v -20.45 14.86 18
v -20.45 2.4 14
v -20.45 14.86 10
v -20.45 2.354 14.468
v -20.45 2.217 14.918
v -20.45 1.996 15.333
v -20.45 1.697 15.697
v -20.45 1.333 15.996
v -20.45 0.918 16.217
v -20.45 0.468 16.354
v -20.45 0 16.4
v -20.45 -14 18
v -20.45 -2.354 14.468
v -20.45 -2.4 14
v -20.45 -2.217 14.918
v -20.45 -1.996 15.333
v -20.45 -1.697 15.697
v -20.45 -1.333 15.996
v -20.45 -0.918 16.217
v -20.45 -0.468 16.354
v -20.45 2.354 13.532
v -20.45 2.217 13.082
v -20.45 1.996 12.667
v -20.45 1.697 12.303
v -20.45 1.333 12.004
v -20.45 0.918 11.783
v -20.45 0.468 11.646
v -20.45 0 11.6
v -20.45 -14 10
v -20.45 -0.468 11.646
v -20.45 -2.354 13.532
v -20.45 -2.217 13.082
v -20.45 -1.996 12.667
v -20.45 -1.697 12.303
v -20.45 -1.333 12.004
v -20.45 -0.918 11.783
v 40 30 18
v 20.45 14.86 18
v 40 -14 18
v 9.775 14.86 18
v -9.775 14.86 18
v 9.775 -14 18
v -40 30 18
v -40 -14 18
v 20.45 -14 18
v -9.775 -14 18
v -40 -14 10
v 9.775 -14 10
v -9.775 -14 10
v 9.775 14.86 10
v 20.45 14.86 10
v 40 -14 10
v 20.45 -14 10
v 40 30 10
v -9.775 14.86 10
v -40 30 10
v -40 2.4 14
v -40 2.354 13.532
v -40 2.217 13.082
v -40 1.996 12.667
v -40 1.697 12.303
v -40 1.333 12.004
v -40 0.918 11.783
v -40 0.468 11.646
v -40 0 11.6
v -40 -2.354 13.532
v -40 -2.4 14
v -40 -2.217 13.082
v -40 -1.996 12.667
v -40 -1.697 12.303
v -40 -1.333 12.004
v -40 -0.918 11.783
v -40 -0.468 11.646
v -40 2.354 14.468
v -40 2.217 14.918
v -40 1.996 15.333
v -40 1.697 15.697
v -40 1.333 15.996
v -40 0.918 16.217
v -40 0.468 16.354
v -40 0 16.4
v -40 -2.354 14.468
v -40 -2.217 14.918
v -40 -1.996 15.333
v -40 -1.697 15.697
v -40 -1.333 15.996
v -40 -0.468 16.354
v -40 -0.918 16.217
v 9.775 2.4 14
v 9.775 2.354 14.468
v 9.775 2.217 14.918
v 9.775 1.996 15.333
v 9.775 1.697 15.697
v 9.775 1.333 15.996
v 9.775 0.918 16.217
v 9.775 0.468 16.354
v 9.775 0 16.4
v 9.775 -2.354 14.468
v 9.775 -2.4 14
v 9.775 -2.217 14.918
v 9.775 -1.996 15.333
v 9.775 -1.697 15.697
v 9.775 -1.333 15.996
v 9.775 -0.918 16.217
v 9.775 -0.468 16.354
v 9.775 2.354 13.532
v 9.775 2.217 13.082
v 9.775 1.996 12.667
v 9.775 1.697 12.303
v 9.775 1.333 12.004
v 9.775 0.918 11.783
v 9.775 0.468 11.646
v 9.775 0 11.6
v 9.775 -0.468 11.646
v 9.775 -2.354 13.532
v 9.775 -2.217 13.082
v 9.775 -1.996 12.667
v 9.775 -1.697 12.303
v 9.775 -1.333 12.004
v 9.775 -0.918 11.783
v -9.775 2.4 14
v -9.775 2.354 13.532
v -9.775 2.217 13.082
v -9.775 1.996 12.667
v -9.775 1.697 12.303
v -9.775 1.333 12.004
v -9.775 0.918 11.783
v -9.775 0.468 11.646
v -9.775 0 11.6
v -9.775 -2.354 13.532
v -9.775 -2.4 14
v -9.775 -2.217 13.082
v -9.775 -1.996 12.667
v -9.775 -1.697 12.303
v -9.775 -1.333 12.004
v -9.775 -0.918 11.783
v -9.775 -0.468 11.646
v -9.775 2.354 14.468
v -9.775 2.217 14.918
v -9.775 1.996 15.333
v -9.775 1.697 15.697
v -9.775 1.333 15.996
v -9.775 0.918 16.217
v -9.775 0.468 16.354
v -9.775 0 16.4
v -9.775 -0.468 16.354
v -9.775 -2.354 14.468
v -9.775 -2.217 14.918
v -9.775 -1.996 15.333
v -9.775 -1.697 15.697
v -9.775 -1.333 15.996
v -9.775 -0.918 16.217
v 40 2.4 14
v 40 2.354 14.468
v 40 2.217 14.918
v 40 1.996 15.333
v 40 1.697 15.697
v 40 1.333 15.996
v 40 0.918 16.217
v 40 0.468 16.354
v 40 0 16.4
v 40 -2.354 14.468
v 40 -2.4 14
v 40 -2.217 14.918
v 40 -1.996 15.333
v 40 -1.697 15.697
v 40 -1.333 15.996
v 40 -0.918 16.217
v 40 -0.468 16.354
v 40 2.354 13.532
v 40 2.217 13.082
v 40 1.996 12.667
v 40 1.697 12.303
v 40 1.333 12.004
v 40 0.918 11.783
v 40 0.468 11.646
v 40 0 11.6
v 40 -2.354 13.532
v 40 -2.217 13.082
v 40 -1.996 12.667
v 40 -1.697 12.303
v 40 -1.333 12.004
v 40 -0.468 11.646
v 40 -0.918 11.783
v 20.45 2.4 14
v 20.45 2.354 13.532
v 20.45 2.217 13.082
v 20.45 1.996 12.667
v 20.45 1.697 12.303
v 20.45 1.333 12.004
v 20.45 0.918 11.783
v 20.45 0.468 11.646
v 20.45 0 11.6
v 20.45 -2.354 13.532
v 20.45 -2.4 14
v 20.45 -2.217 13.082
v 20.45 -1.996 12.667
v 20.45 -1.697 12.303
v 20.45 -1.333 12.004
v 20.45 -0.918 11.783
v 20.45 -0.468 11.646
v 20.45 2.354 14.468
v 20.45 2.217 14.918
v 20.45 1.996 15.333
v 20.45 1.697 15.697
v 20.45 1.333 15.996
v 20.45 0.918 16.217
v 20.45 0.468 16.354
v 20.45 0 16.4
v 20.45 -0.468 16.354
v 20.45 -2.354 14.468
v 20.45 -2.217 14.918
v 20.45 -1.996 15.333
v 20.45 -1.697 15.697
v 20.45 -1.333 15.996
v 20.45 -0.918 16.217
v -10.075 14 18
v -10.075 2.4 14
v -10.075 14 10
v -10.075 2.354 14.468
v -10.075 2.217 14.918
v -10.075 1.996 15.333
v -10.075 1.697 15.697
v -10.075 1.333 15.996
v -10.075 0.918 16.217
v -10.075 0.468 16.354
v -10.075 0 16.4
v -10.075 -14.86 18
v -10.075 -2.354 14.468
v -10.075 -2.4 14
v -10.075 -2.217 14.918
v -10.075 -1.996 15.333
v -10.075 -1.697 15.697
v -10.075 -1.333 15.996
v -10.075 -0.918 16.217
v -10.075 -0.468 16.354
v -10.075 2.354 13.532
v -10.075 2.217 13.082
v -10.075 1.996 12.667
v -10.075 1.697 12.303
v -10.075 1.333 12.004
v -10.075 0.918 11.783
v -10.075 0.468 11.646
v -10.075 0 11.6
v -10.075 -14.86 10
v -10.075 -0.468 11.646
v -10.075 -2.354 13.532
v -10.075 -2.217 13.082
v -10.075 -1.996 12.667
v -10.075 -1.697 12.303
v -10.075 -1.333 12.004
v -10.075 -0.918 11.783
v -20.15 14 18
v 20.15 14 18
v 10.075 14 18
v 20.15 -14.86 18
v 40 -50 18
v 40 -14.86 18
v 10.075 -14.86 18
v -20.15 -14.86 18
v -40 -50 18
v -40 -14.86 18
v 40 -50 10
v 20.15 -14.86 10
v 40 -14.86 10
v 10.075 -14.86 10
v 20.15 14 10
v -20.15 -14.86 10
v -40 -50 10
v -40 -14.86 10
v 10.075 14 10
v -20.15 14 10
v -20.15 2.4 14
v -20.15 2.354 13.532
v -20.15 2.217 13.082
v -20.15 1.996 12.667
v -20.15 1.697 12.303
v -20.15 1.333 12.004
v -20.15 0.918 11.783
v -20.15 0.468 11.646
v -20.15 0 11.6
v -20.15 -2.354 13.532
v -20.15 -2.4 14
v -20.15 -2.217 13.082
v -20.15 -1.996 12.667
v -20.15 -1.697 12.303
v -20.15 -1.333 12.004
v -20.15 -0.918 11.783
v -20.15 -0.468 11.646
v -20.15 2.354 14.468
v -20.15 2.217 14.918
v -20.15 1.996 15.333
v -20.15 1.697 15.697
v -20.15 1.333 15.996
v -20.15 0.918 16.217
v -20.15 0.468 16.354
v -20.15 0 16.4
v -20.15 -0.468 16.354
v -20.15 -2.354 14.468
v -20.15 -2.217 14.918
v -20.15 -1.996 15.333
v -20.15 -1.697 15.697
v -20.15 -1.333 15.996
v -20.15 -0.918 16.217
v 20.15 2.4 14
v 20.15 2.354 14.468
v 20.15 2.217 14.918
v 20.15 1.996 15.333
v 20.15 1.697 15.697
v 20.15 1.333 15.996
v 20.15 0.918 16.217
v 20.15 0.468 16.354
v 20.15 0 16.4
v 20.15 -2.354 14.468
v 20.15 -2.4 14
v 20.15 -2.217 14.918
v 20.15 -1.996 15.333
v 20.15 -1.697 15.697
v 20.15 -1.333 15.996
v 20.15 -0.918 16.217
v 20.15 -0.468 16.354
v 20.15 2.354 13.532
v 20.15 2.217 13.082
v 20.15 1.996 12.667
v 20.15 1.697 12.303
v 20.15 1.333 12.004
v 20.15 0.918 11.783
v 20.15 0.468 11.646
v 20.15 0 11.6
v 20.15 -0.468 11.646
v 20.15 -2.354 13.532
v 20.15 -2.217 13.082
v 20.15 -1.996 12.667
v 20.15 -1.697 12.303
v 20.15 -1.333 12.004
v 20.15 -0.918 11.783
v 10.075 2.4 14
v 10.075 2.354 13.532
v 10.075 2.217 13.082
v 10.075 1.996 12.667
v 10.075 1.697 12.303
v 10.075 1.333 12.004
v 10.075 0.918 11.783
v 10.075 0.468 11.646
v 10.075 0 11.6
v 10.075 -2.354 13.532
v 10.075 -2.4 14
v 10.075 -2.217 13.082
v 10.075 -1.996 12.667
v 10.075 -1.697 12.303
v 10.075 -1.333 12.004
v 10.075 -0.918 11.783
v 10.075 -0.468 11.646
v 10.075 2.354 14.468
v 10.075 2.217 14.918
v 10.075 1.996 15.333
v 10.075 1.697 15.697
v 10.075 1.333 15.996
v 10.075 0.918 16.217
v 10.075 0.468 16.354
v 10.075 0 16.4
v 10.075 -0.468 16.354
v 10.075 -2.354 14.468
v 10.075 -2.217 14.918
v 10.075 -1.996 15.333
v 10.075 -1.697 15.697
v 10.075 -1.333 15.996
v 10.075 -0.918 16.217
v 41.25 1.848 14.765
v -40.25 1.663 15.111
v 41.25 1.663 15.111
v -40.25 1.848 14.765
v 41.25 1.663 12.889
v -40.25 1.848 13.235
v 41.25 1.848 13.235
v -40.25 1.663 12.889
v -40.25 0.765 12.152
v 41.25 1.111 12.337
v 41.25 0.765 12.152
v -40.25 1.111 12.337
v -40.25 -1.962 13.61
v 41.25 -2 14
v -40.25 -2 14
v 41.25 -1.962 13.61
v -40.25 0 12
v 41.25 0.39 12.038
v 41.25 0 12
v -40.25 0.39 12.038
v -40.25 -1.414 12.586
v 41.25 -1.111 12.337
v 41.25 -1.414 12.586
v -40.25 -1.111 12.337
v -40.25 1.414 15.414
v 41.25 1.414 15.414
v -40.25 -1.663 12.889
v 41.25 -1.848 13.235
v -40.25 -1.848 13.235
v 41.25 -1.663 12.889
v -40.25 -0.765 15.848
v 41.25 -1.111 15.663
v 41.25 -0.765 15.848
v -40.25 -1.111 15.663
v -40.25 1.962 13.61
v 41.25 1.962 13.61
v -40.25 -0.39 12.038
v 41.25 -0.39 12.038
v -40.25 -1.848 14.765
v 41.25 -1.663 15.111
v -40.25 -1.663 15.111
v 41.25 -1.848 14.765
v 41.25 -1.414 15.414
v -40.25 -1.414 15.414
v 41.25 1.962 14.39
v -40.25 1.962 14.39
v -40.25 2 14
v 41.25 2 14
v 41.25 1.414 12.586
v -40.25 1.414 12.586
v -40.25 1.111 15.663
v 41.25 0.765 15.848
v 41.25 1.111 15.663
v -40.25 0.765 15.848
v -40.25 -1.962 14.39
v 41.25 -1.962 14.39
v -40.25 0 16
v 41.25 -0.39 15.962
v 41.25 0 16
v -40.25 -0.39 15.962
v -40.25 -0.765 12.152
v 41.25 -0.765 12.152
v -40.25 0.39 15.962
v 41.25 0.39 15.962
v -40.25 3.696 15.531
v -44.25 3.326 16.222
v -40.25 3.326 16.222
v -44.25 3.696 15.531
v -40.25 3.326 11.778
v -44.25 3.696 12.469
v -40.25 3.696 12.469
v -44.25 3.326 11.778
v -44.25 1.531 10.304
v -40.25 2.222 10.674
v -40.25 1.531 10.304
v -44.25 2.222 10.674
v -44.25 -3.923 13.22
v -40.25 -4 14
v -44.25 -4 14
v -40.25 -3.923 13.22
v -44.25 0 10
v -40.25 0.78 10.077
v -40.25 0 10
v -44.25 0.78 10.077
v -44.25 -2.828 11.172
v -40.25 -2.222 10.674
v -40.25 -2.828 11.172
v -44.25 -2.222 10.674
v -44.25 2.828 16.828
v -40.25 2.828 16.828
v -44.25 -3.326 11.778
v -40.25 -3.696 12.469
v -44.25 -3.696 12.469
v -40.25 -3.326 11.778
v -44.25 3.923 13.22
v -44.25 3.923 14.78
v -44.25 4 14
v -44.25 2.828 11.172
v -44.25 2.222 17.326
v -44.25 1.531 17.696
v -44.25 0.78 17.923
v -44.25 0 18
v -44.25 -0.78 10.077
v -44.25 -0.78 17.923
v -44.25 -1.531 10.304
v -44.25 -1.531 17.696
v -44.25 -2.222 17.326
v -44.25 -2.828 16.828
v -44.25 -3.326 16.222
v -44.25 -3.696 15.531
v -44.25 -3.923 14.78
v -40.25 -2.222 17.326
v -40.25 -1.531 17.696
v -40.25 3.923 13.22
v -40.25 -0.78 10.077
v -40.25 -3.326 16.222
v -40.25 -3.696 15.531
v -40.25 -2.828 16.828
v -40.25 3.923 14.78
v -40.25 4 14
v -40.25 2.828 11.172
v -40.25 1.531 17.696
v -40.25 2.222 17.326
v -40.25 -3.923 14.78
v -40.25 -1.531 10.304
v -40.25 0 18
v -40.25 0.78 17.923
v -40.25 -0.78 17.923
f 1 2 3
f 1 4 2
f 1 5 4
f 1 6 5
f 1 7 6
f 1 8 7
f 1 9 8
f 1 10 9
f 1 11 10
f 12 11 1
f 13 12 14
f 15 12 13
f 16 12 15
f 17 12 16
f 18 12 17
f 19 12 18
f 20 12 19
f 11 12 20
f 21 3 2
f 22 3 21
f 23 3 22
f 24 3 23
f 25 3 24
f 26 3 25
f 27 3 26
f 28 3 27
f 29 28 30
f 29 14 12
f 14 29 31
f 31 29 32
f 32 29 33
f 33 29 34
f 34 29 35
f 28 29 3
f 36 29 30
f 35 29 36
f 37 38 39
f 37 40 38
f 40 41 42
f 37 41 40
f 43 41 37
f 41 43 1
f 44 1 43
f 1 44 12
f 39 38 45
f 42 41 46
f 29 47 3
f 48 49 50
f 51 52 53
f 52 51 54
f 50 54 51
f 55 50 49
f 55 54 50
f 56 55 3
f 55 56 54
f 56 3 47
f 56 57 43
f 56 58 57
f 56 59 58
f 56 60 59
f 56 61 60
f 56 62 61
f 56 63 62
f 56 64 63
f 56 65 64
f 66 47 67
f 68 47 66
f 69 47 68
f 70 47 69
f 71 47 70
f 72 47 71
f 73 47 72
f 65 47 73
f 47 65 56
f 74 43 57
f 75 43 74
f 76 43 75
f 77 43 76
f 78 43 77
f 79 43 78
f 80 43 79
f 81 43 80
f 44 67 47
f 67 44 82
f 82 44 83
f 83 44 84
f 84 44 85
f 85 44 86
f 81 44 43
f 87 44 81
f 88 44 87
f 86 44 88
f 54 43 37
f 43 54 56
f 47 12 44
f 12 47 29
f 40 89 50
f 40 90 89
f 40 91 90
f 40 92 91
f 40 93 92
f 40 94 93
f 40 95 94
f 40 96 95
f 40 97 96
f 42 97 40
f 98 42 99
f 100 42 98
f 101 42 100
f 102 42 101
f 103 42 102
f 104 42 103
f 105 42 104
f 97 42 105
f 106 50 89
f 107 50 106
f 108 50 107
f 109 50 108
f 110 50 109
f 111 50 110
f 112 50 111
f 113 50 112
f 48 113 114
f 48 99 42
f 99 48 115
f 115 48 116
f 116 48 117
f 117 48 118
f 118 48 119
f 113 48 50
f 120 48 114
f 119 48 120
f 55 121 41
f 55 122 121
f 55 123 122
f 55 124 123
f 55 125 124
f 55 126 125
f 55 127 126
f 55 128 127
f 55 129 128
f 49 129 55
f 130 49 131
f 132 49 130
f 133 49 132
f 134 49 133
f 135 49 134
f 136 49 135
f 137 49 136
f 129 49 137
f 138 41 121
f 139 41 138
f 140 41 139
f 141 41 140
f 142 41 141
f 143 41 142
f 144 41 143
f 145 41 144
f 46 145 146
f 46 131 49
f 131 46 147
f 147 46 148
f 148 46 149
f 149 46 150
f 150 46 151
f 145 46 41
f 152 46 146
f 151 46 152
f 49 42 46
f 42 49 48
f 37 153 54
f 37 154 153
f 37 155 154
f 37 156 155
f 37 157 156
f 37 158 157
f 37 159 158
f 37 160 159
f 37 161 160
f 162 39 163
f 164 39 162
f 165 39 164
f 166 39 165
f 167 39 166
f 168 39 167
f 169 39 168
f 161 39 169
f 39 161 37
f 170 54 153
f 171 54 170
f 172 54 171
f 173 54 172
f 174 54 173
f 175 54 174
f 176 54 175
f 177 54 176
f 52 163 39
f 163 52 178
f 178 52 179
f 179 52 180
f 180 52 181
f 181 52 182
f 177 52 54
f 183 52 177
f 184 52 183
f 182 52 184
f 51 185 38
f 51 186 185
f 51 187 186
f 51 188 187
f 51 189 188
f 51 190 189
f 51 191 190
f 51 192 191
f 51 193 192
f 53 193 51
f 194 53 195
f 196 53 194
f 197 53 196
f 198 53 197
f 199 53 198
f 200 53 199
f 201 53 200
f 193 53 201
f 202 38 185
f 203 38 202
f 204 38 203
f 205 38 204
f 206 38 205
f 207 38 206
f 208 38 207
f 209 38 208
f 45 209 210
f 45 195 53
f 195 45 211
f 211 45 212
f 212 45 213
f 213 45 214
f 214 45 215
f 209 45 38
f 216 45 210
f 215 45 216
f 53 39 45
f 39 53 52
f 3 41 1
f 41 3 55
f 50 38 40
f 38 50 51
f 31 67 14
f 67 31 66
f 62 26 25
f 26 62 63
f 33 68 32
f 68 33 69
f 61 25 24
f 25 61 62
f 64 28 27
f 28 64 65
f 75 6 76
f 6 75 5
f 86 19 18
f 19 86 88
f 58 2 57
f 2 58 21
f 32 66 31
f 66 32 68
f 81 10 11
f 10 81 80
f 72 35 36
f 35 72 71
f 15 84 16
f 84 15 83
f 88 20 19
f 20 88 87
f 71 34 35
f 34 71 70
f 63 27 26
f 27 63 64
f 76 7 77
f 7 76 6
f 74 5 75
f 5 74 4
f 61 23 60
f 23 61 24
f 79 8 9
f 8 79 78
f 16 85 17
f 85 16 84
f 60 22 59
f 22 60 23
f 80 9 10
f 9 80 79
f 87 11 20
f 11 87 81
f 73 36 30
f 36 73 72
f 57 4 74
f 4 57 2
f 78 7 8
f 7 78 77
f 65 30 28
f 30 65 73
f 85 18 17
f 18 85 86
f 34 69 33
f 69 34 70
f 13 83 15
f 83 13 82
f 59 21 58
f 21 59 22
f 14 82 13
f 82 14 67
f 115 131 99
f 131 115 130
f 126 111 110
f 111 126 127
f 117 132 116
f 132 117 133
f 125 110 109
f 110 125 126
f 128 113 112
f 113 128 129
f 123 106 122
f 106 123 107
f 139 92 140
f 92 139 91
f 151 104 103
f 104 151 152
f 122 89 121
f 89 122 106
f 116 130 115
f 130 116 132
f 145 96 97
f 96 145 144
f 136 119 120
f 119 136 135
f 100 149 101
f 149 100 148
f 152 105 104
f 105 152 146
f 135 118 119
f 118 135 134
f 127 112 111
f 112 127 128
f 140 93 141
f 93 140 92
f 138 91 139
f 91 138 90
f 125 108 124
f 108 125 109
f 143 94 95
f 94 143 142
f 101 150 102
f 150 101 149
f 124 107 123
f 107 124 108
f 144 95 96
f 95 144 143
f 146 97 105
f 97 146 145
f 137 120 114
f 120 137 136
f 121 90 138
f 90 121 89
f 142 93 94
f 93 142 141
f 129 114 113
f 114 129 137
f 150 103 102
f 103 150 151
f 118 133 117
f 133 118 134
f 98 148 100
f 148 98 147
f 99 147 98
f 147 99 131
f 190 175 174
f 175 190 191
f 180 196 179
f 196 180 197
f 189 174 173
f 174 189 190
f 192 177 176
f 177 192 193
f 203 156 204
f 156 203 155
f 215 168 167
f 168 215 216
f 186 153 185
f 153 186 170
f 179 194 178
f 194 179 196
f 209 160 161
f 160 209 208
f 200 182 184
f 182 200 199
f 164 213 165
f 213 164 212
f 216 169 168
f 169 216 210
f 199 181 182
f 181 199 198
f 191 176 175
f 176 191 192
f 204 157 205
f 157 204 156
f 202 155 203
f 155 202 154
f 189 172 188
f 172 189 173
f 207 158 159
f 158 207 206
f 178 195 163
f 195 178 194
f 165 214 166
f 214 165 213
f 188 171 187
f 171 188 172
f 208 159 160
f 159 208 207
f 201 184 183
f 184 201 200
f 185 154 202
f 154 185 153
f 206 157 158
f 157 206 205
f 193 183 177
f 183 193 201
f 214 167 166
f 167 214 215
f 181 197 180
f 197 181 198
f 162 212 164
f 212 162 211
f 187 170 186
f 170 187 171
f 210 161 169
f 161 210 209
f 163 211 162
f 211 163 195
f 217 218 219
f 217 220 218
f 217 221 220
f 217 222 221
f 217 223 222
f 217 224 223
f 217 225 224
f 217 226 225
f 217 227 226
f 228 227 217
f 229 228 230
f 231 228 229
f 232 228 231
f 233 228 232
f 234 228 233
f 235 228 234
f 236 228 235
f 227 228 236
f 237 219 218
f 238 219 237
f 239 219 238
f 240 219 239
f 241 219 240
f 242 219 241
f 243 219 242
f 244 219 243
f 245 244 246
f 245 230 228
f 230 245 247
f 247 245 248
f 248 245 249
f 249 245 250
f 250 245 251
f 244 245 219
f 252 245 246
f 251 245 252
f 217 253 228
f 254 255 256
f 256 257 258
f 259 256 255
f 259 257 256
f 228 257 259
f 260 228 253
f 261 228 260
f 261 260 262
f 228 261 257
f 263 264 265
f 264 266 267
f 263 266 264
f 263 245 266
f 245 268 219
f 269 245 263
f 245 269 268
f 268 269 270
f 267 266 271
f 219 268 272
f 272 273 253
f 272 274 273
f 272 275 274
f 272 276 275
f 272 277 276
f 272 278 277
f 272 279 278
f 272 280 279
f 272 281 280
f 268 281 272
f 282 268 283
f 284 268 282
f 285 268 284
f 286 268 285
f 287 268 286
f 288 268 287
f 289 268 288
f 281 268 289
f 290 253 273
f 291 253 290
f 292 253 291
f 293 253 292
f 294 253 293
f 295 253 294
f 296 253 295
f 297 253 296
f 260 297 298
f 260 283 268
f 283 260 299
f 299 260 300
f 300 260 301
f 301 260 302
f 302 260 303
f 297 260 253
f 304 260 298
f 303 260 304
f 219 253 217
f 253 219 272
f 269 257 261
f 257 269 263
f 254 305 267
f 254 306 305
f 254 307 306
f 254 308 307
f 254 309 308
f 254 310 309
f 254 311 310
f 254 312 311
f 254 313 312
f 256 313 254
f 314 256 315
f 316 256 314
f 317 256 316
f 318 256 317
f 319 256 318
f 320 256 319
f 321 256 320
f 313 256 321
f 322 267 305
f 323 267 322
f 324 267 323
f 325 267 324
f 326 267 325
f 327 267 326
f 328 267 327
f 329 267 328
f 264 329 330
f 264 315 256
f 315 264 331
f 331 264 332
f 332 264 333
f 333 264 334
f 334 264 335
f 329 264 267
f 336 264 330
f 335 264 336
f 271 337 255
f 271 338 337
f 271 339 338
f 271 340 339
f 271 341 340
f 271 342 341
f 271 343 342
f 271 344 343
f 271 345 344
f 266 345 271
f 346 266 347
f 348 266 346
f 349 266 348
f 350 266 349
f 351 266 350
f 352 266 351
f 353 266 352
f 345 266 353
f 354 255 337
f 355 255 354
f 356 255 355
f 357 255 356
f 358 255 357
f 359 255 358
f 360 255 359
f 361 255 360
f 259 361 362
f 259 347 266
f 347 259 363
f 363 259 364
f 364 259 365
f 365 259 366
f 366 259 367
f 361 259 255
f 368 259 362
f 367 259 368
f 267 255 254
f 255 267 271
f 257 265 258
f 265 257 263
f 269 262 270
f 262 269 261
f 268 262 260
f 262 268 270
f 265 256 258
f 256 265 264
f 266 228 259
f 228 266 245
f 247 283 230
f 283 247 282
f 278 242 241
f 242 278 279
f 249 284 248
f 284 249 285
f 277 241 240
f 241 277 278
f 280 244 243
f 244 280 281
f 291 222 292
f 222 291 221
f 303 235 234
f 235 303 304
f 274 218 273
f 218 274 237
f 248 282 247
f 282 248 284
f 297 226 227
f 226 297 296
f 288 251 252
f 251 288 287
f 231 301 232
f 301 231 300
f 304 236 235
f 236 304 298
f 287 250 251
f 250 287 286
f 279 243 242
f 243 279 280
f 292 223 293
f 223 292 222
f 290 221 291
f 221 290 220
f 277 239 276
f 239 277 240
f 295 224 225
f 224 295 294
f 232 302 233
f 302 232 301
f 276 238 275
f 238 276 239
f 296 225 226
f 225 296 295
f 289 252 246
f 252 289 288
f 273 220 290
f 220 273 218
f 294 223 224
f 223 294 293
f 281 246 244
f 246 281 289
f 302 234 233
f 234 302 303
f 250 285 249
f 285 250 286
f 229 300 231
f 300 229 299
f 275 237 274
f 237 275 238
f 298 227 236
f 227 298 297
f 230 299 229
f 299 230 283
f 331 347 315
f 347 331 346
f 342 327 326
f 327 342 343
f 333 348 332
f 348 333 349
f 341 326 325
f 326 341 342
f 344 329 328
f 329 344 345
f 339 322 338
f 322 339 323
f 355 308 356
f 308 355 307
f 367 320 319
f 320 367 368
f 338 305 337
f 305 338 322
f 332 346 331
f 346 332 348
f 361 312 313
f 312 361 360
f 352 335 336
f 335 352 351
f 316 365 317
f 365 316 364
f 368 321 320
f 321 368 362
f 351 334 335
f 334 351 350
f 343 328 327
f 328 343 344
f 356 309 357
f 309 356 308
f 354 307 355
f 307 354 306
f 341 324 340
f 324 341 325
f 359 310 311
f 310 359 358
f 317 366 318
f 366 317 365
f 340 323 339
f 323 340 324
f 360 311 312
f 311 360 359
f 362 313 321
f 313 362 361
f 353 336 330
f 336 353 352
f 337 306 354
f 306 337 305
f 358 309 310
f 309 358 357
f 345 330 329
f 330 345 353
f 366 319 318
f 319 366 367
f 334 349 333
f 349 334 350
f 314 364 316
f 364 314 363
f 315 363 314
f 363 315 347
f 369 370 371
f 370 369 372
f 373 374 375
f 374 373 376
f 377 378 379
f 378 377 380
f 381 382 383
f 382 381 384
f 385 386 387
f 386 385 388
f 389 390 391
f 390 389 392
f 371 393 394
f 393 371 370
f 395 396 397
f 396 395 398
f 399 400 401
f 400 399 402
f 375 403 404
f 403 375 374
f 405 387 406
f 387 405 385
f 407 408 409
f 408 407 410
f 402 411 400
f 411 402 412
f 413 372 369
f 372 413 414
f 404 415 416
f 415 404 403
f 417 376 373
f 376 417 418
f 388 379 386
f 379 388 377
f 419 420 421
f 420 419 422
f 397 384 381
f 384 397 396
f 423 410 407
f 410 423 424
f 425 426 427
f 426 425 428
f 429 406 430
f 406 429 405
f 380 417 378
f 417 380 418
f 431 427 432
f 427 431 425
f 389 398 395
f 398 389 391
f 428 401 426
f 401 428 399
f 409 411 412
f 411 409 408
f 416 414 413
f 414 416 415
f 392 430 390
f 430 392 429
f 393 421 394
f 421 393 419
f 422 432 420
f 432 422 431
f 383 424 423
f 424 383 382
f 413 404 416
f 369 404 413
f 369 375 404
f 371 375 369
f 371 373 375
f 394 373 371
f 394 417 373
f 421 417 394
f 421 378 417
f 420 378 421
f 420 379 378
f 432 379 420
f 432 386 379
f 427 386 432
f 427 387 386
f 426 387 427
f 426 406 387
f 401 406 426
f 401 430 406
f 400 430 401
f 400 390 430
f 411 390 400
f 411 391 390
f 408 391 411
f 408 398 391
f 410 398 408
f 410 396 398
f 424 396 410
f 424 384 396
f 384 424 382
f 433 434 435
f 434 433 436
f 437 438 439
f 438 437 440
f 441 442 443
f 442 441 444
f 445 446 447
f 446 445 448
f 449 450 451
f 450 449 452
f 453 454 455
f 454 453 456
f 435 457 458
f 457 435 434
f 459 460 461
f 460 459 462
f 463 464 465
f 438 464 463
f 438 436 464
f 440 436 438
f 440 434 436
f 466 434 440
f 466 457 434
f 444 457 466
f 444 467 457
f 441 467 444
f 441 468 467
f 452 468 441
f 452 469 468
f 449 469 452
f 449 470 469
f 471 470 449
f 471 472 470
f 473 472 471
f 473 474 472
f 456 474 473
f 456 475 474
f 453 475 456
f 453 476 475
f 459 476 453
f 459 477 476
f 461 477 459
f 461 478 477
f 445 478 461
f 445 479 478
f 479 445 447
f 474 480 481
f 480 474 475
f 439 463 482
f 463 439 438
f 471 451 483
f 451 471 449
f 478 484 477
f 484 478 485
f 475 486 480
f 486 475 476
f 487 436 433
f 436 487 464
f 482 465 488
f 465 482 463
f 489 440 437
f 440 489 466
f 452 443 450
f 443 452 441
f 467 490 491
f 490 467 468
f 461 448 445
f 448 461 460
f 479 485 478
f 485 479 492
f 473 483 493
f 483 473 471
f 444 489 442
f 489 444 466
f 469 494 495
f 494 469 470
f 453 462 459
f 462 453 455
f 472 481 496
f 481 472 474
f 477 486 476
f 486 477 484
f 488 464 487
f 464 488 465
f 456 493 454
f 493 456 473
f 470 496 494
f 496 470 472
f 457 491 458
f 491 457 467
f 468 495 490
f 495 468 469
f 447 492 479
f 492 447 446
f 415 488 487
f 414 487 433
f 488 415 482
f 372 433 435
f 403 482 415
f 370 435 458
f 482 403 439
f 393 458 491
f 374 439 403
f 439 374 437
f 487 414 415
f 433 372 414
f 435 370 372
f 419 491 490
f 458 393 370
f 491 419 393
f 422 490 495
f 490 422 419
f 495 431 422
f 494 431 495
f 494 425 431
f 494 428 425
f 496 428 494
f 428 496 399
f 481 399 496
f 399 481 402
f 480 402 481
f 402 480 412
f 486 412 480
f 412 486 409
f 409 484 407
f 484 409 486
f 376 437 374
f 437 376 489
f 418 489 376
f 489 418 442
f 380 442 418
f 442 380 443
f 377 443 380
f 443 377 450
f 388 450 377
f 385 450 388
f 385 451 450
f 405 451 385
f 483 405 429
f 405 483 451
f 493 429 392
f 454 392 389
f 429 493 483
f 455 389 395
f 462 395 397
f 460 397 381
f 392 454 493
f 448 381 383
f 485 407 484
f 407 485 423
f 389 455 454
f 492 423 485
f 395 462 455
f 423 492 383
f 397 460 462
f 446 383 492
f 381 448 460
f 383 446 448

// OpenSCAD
$fn = 32;

// ------------------------------------------------------------------------
// Butt hinge: hinge 80 mm, leaf swung 0 deg
// Every part is its own module, assembly() places every instance.
// ------------------------------------------------------------------------

// --- part 1 ---
module hinge_base() {
  difference() {
    union() {
      translate([-40, -14, -4]) cube([19.55, 44, 8]);
      translate([-9.775, -14, -4]) cube([19.55, 44, 8]);
      translate([20.45, -14, -4]) cube([19.55, 44, 8]);
      translate([-40, 14.86, -4]) cube([80, 15.14, 8]);
    }
    translate([-30.225, 0, 0]) rotate([0, 90, 0]) cylinder(h = 21.55, d = 4.8, center = true);
    translate([0, 0, 0]) rotate([0, 90, 0]) cylinder(h = 21.55, d = 4.8, center = true);
    translate([30.225, 0, 0]) rotate([0, 90, 0]) cylinder(h = 21.55, d = 4.8, center = true);
  }
}

// --- part 2 ---
module hinge_mover() {
  difference() {
    union() {
      translate([-20.15, -50, -4]) cube([10.075, 64, 8]);
      translate([10.075, -50, -4]) cube([10.075, 64, 8]);
      translate([-40, -50, -4]) cube([80, 35.14, 8]);
    }
    translate([-15.113, 0, 0]) rotate([0, 90, 0]) cylinder(h = 12.075, d = 4.8, center = true);
    translate([15.113, 0, 0]) rotate([0, 90, 0]) cylinder(h = 12.075, d = 4.8, center = true);
  }
}

// --- part 3 ---
module hinge_pin() {
  rotate([0, 90, 0]) cylinder(h = 82.5, d = 4, center = true);
  translate([-44.25, 0, 0]) rotate([0, 90, 0]) cylinder(h = 4, d = 8);
}

// --- assembly ---
module assembly() {
  color([0.80, 0.24, 0.20]) translate([0, 0, 14]) rotate([0, 0, 0]) hinge_base();
  color([0.20, 0.45, 0.75]) translate([0, 0, 14]) rotate([0, 0, 0]) hinge_mover();
  color([0.25, 0.62, 0.32]) translate([0, 0, 14]) rotate([0, 0, 0]) hinge_pin();
}

assembly();
